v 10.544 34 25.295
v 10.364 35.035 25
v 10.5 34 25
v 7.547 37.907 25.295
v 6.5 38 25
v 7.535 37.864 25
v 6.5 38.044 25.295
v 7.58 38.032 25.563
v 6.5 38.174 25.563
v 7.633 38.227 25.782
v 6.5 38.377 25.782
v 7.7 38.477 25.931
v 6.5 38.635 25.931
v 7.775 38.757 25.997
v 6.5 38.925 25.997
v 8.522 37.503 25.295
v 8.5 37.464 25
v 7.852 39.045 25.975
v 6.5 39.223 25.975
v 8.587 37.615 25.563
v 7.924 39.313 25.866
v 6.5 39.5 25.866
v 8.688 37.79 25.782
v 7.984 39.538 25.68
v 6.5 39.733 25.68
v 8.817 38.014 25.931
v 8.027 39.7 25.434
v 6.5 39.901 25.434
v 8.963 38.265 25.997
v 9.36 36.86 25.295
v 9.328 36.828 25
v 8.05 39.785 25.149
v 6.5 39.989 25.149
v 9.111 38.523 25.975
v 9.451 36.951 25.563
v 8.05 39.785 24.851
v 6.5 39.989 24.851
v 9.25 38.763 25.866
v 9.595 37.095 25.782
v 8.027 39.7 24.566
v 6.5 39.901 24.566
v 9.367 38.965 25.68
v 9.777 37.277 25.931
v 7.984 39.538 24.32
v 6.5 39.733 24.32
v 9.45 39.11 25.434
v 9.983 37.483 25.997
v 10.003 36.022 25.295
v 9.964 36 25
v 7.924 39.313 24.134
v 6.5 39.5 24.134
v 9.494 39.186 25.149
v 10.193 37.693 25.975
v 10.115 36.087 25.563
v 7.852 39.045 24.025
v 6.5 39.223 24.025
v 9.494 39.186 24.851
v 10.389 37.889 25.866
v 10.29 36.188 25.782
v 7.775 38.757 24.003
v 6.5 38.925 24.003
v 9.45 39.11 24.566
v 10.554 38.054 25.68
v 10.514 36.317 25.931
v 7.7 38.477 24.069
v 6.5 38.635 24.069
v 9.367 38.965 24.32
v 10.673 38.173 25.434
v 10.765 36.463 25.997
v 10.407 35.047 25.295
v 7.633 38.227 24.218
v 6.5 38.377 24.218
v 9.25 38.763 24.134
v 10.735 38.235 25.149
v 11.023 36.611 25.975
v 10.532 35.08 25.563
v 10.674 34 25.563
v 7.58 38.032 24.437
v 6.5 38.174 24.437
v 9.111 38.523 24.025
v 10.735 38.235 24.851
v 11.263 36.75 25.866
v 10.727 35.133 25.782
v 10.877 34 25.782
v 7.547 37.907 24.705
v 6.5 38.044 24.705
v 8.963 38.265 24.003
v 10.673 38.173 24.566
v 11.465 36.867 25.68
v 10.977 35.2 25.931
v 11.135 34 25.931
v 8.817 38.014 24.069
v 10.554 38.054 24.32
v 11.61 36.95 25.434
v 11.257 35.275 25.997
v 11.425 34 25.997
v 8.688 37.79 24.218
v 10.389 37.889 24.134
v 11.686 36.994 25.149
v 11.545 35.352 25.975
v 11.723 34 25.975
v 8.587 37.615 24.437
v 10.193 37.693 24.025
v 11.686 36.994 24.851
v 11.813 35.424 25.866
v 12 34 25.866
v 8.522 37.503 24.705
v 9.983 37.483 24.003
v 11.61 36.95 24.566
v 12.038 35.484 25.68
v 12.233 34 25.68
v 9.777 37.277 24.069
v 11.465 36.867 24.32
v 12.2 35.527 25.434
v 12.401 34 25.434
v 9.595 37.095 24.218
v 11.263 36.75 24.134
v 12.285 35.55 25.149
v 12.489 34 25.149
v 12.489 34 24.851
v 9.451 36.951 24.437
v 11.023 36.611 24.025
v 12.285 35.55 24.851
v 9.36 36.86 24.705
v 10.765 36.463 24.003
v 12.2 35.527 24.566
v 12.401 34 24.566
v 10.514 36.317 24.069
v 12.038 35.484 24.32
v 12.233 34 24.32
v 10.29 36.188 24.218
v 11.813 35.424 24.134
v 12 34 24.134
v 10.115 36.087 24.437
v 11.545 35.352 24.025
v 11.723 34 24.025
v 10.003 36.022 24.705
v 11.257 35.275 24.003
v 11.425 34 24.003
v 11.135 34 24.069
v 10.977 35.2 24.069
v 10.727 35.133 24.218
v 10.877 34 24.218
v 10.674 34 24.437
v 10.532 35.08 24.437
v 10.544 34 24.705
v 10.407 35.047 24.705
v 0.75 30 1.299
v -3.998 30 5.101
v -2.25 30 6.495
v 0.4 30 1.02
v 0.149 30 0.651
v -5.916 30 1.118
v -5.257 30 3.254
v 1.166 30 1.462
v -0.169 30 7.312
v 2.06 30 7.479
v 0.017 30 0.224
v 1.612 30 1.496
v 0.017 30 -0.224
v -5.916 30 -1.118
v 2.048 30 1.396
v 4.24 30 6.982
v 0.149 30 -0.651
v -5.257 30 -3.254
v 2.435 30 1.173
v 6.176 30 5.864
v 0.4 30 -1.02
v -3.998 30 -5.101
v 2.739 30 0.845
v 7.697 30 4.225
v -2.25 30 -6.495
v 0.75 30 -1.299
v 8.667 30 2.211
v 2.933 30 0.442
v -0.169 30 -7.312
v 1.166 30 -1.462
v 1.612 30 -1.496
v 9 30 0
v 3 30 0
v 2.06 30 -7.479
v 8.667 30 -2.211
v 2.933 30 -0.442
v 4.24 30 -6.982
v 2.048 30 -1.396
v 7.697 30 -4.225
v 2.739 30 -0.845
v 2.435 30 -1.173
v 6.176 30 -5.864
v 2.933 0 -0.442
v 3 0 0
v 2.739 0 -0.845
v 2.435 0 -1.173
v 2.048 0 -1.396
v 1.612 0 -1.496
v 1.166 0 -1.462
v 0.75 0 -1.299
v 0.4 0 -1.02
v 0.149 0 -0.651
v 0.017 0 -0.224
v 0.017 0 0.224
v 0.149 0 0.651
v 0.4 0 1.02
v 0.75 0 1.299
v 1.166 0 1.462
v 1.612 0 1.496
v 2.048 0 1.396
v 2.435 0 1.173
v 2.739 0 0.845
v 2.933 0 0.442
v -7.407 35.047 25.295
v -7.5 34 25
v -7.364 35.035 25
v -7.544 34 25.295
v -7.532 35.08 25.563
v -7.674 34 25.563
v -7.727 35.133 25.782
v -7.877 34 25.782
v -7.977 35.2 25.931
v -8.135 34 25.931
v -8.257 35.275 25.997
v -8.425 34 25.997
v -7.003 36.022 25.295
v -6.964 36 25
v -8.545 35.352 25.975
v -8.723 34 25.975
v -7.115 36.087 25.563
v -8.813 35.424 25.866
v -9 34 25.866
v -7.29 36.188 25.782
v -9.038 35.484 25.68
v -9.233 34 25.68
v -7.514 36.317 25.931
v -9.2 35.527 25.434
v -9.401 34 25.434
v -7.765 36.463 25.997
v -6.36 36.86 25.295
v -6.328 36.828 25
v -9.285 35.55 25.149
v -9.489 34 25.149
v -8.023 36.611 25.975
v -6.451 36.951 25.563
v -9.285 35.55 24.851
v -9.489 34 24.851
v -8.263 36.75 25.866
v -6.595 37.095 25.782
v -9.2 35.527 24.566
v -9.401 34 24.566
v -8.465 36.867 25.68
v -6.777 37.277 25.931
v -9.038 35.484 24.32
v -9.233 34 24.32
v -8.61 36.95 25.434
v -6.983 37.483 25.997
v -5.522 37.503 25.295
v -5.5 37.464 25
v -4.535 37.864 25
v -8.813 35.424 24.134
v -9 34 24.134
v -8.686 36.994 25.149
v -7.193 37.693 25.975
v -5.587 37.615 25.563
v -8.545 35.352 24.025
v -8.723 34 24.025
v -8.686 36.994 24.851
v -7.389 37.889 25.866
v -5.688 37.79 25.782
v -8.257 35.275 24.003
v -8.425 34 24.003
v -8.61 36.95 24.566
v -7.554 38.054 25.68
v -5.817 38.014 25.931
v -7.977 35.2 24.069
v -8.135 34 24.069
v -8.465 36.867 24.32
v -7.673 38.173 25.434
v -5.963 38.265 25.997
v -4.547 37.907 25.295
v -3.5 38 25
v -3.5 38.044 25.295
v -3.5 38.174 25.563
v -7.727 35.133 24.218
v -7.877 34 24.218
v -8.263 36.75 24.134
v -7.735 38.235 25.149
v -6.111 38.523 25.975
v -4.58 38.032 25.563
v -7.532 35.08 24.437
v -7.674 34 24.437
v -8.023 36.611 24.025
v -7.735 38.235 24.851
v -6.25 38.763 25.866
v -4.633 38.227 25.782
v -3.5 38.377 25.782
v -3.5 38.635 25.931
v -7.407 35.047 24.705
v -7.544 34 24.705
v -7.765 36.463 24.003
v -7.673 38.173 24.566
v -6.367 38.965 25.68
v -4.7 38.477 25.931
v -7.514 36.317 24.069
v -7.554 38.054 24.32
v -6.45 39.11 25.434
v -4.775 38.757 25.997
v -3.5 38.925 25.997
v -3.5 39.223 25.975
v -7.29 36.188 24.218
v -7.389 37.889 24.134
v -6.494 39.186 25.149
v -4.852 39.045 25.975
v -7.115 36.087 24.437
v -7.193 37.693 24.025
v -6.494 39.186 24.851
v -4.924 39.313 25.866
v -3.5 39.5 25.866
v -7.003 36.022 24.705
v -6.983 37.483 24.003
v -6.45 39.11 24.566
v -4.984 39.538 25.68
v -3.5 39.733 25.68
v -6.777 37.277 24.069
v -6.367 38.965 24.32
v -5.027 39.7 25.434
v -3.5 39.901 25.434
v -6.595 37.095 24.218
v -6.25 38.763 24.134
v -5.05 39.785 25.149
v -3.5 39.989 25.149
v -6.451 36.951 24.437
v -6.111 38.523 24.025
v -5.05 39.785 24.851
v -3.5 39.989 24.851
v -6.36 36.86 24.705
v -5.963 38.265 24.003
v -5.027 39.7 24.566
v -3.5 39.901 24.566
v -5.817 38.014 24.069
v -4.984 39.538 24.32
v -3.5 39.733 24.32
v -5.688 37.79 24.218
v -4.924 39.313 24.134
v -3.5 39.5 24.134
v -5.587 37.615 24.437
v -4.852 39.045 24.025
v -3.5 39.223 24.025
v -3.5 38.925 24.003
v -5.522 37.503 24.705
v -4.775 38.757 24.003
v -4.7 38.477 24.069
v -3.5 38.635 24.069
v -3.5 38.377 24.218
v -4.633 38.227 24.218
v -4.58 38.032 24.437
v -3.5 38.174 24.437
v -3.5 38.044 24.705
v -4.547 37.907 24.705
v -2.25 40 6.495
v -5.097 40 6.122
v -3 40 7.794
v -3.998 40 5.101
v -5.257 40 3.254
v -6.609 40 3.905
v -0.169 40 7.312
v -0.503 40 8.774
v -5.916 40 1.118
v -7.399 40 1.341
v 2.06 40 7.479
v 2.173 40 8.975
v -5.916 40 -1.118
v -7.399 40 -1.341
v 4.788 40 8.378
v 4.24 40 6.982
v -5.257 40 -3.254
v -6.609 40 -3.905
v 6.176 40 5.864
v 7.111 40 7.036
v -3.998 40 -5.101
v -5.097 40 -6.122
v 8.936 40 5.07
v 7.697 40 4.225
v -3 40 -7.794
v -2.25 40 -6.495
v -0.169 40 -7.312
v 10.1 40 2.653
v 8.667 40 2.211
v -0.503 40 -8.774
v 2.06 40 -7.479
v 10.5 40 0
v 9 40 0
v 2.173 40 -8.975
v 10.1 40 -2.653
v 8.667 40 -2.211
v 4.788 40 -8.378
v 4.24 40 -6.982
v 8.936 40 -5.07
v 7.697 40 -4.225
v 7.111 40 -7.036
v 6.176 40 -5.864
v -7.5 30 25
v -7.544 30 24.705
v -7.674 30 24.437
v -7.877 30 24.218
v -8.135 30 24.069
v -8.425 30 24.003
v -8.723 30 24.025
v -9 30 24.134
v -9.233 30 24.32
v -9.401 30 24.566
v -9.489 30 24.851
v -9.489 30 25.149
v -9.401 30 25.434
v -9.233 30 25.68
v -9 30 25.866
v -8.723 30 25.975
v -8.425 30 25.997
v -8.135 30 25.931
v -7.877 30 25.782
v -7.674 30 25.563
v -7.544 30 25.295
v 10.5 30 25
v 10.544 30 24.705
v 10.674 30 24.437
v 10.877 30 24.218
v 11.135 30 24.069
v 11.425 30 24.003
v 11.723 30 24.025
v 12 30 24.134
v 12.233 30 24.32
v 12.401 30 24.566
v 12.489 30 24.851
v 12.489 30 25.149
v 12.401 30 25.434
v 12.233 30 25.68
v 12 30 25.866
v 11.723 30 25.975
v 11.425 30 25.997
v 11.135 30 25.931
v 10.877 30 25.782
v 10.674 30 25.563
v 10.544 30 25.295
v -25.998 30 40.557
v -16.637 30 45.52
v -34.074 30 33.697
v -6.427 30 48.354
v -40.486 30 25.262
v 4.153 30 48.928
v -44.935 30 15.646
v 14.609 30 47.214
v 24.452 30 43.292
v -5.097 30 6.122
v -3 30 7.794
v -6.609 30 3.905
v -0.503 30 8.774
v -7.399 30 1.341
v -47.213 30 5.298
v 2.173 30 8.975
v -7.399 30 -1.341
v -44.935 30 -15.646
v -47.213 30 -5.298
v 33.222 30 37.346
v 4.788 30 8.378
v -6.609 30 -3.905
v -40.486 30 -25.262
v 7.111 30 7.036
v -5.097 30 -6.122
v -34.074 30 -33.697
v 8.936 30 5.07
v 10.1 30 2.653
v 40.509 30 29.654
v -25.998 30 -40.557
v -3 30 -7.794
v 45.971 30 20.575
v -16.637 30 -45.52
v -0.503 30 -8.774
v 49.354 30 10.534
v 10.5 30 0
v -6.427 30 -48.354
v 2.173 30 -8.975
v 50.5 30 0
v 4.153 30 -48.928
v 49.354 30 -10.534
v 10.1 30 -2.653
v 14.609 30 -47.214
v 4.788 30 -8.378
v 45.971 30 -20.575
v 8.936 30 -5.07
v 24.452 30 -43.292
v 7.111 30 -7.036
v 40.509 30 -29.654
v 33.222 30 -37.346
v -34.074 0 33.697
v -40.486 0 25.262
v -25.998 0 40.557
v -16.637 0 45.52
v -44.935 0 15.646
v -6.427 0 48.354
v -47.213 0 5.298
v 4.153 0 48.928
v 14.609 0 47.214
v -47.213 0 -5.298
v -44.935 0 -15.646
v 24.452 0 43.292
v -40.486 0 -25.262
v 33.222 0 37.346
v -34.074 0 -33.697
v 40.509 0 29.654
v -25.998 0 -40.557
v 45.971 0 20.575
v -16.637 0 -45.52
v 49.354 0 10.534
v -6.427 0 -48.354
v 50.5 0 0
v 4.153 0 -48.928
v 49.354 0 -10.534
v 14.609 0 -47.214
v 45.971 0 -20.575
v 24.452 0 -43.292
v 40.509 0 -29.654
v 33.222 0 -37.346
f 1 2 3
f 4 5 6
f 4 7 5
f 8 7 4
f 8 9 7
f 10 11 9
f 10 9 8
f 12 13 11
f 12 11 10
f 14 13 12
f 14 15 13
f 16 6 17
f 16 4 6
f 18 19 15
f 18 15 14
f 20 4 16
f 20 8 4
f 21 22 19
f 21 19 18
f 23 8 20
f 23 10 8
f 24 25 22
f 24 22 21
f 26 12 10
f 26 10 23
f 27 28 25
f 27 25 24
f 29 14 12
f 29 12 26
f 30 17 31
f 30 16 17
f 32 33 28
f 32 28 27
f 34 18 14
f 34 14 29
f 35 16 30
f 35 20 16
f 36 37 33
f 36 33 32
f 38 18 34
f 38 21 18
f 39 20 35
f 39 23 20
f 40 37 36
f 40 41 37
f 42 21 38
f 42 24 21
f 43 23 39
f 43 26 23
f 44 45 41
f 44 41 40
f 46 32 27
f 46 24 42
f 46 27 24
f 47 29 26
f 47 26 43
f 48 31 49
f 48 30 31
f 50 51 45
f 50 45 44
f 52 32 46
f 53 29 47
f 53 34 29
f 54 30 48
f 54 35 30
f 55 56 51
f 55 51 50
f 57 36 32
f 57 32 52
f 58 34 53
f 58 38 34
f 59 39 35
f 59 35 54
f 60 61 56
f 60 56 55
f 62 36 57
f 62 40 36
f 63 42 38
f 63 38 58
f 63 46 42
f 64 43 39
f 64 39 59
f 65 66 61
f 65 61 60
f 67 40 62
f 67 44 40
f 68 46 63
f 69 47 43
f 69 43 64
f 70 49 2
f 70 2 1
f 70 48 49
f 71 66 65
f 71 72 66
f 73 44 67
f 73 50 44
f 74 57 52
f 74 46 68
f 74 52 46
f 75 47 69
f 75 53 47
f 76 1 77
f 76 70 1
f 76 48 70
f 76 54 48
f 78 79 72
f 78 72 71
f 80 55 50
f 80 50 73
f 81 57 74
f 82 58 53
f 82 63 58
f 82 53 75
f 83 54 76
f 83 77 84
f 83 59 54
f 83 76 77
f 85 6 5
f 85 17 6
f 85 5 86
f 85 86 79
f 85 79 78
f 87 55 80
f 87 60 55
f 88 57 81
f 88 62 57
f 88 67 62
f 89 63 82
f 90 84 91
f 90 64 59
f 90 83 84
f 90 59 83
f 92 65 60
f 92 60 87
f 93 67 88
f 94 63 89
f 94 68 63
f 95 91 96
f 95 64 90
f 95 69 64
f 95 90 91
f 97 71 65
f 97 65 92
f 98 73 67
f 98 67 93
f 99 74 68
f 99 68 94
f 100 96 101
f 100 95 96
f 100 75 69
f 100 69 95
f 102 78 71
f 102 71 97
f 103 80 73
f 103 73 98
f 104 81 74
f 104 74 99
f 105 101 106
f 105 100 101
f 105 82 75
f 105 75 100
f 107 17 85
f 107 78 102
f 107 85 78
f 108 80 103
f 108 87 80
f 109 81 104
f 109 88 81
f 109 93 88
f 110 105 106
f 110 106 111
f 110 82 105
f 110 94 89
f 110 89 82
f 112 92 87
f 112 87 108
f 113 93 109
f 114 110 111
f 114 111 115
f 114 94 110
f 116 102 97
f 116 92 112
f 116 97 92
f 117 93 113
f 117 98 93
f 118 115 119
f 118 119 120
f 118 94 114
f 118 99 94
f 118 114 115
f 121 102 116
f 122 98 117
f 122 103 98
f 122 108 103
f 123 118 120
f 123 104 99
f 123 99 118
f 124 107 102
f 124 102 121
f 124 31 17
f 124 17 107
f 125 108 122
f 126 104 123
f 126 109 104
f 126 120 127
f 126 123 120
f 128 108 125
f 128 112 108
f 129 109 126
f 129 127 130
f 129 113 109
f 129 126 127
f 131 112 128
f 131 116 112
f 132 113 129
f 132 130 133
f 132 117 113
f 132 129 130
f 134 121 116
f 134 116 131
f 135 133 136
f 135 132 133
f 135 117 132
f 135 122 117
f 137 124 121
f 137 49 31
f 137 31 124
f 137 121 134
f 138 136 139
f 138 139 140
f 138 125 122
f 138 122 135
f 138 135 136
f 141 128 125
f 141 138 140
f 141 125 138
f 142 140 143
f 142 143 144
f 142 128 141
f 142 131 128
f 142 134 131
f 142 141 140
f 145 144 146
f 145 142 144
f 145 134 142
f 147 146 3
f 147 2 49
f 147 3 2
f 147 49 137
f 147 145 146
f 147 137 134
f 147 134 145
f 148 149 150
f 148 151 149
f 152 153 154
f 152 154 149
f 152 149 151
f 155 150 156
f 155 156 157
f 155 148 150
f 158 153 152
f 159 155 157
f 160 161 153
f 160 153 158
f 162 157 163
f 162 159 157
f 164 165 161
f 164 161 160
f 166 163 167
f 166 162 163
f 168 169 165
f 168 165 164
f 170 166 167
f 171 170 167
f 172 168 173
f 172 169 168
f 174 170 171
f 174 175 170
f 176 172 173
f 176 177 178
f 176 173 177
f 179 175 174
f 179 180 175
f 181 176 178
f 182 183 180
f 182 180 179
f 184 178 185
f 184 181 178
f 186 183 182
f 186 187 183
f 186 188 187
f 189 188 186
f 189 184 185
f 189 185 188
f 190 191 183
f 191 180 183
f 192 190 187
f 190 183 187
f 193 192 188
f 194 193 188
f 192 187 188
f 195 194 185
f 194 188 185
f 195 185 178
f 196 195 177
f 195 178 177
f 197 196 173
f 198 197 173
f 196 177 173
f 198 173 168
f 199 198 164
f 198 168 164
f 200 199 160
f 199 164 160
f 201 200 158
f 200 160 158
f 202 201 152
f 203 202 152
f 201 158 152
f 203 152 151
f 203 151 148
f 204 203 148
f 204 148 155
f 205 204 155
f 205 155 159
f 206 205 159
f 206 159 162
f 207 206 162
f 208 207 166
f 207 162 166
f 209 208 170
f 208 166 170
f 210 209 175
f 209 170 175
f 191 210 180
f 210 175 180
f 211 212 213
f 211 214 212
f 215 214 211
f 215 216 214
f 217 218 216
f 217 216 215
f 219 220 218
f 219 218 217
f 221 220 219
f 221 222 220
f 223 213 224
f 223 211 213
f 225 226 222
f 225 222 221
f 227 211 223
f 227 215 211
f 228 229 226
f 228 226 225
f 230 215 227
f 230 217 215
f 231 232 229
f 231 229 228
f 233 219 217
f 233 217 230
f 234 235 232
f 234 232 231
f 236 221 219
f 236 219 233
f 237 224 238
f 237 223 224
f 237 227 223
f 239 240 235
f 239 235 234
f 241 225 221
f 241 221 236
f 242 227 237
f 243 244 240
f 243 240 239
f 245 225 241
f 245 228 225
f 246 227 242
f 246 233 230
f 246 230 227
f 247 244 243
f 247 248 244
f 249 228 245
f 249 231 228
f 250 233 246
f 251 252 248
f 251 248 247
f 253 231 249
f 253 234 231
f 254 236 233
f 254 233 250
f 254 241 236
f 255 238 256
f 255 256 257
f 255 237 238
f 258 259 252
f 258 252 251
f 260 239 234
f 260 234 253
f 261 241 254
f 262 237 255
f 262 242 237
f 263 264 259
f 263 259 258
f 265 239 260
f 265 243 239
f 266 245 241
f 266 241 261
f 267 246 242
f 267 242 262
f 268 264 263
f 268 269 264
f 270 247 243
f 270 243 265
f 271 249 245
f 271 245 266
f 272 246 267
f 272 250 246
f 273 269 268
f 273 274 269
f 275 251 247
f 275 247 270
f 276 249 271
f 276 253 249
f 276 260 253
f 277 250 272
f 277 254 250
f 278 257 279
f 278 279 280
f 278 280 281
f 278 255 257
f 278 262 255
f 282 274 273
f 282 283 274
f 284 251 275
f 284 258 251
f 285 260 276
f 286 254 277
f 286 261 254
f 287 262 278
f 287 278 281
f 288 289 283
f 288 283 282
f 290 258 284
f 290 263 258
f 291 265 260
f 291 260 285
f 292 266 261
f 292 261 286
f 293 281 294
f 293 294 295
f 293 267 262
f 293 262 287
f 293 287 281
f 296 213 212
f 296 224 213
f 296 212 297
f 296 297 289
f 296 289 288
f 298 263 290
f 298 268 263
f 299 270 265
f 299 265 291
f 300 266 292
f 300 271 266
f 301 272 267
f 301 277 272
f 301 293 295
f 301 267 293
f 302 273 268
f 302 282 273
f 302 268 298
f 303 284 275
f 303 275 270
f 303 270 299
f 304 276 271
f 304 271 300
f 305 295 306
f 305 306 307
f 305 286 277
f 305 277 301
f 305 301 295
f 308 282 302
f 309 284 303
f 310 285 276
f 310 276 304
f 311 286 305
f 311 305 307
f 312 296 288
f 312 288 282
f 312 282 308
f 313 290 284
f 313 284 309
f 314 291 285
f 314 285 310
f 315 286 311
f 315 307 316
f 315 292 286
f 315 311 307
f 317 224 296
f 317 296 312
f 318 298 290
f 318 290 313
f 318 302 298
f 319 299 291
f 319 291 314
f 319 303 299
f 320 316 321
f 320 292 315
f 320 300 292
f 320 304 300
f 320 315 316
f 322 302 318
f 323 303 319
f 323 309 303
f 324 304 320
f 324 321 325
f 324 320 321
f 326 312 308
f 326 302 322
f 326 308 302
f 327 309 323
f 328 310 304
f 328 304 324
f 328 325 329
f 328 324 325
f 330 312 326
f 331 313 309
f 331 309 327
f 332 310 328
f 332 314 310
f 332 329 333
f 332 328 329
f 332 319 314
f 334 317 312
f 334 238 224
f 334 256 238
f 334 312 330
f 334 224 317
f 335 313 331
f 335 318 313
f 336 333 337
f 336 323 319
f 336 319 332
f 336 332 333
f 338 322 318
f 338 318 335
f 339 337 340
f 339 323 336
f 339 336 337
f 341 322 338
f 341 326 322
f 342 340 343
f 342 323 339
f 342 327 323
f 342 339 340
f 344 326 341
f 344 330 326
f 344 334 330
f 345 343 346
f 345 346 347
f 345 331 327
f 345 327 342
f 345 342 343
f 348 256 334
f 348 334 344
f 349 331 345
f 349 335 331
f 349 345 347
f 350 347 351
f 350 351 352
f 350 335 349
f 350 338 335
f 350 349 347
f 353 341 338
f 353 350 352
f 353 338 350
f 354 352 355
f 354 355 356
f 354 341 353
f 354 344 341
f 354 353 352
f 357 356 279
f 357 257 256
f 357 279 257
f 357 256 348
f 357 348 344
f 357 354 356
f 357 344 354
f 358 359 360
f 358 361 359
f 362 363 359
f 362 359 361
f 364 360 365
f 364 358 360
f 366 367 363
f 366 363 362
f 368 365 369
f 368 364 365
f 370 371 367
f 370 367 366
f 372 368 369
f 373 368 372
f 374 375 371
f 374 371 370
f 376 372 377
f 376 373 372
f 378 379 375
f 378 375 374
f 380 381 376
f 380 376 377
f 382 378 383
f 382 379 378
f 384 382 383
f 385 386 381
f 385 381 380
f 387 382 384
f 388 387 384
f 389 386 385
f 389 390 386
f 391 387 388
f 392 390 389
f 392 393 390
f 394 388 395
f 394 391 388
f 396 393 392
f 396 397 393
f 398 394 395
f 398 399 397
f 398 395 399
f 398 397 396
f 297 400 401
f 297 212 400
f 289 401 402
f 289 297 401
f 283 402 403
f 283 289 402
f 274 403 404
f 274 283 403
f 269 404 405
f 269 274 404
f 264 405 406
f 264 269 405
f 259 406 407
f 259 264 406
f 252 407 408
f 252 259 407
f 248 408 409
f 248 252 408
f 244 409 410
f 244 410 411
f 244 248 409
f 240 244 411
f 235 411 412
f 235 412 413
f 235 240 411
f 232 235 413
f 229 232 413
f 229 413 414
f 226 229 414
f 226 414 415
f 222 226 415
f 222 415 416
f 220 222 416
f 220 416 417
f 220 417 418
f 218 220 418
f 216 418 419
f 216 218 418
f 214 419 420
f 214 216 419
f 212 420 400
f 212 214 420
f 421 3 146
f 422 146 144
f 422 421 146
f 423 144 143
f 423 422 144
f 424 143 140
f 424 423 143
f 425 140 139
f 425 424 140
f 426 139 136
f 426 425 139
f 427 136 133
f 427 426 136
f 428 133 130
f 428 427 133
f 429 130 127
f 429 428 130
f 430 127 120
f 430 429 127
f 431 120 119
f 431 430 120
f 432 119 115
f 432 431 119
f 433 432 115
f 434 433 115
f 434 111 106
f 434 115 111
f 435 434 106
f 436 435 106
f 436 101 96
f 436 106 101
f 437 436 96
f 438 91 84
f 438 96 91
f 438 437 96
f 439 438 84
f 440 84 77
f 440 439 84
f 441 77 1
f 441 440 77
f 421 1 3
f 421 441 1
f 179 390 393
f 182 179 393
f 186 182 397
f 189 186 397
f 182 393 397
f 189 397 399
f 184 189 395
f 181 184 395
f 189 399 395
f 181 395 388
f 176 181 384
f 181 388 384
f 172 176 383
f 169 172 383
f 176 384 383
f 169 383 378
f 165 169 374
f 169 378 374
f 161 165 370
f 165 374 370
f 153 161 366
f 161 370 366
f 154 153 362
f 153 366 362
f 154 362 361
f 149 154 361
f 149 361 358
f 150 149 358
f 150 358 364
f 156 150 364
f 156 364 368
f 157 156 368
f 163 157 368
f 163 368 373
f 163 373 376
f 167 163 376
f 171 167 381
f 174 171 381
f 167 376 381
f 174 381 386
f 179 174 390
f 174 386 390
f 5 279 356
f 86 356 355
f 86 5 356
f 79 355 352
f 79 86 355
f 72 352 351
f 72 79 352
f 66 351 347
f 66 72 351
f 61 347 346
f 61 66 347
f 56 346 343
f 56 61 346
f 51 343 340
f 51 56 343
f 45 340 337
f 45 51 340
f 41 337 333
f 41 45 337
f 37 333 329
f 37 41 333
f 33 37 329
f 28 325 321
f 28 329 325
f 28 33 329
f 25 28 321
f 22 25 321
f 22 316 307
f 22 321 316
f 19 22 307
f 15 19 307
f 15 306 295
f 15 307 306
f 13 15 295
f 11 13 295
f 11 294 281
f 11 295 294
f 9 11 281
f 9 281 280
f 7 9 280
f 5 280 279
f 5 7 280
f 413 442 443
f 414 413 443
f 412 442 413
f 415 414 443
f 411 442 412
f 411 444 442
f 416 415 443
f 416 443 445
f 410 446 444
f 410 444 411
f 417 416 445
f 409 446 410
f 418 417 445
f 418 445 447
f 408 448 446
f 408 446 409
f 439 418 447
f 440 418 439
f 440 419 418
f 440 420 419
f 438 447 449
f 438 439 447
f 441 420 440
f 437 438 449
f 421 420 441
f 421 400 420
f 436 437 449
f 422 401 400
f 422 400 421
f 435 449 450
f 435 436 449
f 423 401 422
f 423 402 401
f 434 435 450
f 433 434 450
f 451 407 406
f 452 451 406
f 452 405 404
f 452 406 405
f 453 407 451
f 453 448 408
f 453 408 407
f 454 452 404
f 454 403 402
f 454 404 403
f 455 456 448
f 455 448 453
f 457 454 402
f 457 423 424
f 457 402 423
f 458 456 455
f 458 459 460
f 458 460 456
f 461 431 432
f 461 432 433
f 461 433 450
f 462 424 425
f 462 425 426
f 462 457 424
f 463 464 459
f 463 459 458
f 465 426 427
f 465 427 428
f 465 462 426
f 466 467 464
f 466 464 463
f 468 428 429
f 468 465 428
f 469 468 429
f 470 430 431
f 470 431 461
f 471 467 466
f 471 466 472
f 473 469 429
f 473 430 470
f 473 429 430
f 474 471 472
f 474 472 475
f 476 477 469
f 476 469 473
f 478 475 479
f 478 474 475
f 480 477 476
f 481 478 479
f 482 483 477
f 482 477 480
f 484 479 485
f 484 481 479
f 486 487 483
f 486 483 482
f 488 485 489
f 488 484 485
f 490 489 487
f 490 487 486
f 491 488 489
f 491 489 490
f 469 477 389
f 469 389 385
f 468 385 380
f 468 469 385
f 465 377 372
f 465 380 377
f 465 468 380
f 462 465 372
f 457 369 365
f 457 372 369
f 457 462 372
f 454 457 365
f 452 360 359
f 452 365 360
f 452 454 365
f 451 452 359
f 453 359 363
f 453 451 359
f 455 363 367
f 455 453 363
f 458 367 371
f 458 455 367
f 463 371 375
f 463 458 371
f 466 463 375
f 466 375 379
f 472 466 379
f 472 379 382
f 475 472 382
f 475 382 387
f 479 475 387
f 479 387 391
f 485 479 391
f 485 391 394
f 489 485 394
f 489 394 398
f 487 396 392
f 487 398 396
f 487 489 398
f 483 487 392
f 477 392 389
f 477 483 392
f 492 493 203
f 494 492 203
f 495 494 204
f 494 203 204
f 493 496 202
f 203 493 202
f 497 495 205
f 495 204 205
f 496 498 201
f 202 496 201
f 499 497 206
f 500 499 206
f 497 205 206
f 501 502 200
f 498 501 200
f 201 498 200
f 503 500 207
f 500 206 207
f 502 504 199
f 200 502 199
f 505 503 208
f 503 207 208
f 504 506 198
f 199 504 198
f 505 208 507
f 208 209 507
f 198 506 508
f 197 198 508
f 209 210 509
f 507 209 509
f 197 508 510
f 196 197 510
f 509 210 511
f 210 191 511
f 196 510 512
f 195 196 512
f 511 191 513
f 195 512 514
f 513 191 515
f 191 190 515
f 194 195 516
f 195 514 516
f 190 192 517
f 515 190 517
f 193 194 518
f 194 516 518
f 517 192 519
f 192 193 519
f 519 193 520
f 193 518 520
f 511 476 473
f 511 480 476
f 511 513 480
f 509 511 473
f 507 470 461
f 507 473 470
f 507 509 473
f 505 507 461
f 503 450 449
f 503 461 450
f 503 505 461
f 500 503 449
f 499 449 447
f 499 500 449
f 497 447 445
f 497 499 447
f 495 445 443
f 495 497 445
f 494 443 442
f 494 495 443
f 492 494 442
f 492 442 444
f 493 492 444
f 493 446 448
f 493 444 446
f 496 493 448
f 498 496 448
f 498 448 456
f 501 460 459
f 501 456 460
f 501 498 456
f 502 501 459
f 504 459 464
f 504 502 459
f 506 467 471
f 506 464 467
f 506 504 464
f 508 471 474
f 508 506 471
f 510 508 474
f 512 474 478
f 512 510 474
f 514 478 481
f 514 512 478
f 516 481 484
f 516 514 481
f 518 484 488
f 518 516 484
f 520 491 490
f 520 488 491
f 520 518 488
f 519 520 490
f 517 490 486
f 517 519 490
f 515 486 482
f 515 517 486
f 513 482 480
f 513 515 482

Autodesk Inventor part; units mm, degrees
ref_plane "YZ Plane" through (0, 0, 0) normal (1, 0, 0) x (0, 1, 0)
ref_plane "XZ Plane" through (0, 0, 0) normal (0, 1, 0) x (-1, 0, 0)
ref_plane "XY Plane" through (0, 0, 0) normal (0, 0, 1) x (1, 0, 0)
sketch "Sketch1" plane through (0, 0, 0) normal (0, 0, 1) x (1, 0, 0)
  line L0 (1.5, 0) -> (1.5, 40)
  line L1 (3, 0) -> (3, 30)
  line L2 (3, 30) -> (9, 30)
  line L3 (9, 30) -> (9, 40)
  line L4 (9, 40) -> (10.5, 40)
  line L5 (10.5, 40) -> (10.5, 30)
  line L6 (10.5, 30) -> (50.5, 30)
  line L7 (50.5, 30) -> (50.5, 0)
  line L8 (50.5, 0) -> (3, 0)
  point P0 (0, 0)
revolve "Revolution1" add sketch "Sketch1" angle 360 about axis through (1.5, 0, 0) along (0, 1, 0)
sketch "Sketch2" plane through (1.5, 30, 0) normal (0, 1, 0) x (1, 0, 0)
  point P0 (-1.5, 0)
sketch "Sketch4" plane through (1.5, 30, 0) normal (0, 1, 0) x (1, 0, 0)
  circle A0 centre (0, 0) radius 1.5 projected
  circle A1 centre (-10, -25) radius 1
  point P0 (-1.5, 0)
sketch3d "3D Sketch3"
  line L0 (-8.5, 30, 25) -> (-8.5, 34, 25)
  arc A0 (-8.5, 34, 25) -> (-3.5, 39, 25) centre (-3.5, 34, 25) ccw
  line L1 (-3.5, 39, 25) -> (6.5, 39, 25)
  arc A1 (6.5, 39, 25) -> (11.5, 34, 25) centre (6.5, 34, 25) ccw
  line L2 (11.5, 34, 25) -> (11.5, 30, 25)
  dimension "d21" = 5
  dimension "d22" = 5
sweep "Sweep2" add profiles "Sketch4" path "3D Sketch3" contours A1
equation "\"d22\" = d21"
properties part number "bulckhead"
